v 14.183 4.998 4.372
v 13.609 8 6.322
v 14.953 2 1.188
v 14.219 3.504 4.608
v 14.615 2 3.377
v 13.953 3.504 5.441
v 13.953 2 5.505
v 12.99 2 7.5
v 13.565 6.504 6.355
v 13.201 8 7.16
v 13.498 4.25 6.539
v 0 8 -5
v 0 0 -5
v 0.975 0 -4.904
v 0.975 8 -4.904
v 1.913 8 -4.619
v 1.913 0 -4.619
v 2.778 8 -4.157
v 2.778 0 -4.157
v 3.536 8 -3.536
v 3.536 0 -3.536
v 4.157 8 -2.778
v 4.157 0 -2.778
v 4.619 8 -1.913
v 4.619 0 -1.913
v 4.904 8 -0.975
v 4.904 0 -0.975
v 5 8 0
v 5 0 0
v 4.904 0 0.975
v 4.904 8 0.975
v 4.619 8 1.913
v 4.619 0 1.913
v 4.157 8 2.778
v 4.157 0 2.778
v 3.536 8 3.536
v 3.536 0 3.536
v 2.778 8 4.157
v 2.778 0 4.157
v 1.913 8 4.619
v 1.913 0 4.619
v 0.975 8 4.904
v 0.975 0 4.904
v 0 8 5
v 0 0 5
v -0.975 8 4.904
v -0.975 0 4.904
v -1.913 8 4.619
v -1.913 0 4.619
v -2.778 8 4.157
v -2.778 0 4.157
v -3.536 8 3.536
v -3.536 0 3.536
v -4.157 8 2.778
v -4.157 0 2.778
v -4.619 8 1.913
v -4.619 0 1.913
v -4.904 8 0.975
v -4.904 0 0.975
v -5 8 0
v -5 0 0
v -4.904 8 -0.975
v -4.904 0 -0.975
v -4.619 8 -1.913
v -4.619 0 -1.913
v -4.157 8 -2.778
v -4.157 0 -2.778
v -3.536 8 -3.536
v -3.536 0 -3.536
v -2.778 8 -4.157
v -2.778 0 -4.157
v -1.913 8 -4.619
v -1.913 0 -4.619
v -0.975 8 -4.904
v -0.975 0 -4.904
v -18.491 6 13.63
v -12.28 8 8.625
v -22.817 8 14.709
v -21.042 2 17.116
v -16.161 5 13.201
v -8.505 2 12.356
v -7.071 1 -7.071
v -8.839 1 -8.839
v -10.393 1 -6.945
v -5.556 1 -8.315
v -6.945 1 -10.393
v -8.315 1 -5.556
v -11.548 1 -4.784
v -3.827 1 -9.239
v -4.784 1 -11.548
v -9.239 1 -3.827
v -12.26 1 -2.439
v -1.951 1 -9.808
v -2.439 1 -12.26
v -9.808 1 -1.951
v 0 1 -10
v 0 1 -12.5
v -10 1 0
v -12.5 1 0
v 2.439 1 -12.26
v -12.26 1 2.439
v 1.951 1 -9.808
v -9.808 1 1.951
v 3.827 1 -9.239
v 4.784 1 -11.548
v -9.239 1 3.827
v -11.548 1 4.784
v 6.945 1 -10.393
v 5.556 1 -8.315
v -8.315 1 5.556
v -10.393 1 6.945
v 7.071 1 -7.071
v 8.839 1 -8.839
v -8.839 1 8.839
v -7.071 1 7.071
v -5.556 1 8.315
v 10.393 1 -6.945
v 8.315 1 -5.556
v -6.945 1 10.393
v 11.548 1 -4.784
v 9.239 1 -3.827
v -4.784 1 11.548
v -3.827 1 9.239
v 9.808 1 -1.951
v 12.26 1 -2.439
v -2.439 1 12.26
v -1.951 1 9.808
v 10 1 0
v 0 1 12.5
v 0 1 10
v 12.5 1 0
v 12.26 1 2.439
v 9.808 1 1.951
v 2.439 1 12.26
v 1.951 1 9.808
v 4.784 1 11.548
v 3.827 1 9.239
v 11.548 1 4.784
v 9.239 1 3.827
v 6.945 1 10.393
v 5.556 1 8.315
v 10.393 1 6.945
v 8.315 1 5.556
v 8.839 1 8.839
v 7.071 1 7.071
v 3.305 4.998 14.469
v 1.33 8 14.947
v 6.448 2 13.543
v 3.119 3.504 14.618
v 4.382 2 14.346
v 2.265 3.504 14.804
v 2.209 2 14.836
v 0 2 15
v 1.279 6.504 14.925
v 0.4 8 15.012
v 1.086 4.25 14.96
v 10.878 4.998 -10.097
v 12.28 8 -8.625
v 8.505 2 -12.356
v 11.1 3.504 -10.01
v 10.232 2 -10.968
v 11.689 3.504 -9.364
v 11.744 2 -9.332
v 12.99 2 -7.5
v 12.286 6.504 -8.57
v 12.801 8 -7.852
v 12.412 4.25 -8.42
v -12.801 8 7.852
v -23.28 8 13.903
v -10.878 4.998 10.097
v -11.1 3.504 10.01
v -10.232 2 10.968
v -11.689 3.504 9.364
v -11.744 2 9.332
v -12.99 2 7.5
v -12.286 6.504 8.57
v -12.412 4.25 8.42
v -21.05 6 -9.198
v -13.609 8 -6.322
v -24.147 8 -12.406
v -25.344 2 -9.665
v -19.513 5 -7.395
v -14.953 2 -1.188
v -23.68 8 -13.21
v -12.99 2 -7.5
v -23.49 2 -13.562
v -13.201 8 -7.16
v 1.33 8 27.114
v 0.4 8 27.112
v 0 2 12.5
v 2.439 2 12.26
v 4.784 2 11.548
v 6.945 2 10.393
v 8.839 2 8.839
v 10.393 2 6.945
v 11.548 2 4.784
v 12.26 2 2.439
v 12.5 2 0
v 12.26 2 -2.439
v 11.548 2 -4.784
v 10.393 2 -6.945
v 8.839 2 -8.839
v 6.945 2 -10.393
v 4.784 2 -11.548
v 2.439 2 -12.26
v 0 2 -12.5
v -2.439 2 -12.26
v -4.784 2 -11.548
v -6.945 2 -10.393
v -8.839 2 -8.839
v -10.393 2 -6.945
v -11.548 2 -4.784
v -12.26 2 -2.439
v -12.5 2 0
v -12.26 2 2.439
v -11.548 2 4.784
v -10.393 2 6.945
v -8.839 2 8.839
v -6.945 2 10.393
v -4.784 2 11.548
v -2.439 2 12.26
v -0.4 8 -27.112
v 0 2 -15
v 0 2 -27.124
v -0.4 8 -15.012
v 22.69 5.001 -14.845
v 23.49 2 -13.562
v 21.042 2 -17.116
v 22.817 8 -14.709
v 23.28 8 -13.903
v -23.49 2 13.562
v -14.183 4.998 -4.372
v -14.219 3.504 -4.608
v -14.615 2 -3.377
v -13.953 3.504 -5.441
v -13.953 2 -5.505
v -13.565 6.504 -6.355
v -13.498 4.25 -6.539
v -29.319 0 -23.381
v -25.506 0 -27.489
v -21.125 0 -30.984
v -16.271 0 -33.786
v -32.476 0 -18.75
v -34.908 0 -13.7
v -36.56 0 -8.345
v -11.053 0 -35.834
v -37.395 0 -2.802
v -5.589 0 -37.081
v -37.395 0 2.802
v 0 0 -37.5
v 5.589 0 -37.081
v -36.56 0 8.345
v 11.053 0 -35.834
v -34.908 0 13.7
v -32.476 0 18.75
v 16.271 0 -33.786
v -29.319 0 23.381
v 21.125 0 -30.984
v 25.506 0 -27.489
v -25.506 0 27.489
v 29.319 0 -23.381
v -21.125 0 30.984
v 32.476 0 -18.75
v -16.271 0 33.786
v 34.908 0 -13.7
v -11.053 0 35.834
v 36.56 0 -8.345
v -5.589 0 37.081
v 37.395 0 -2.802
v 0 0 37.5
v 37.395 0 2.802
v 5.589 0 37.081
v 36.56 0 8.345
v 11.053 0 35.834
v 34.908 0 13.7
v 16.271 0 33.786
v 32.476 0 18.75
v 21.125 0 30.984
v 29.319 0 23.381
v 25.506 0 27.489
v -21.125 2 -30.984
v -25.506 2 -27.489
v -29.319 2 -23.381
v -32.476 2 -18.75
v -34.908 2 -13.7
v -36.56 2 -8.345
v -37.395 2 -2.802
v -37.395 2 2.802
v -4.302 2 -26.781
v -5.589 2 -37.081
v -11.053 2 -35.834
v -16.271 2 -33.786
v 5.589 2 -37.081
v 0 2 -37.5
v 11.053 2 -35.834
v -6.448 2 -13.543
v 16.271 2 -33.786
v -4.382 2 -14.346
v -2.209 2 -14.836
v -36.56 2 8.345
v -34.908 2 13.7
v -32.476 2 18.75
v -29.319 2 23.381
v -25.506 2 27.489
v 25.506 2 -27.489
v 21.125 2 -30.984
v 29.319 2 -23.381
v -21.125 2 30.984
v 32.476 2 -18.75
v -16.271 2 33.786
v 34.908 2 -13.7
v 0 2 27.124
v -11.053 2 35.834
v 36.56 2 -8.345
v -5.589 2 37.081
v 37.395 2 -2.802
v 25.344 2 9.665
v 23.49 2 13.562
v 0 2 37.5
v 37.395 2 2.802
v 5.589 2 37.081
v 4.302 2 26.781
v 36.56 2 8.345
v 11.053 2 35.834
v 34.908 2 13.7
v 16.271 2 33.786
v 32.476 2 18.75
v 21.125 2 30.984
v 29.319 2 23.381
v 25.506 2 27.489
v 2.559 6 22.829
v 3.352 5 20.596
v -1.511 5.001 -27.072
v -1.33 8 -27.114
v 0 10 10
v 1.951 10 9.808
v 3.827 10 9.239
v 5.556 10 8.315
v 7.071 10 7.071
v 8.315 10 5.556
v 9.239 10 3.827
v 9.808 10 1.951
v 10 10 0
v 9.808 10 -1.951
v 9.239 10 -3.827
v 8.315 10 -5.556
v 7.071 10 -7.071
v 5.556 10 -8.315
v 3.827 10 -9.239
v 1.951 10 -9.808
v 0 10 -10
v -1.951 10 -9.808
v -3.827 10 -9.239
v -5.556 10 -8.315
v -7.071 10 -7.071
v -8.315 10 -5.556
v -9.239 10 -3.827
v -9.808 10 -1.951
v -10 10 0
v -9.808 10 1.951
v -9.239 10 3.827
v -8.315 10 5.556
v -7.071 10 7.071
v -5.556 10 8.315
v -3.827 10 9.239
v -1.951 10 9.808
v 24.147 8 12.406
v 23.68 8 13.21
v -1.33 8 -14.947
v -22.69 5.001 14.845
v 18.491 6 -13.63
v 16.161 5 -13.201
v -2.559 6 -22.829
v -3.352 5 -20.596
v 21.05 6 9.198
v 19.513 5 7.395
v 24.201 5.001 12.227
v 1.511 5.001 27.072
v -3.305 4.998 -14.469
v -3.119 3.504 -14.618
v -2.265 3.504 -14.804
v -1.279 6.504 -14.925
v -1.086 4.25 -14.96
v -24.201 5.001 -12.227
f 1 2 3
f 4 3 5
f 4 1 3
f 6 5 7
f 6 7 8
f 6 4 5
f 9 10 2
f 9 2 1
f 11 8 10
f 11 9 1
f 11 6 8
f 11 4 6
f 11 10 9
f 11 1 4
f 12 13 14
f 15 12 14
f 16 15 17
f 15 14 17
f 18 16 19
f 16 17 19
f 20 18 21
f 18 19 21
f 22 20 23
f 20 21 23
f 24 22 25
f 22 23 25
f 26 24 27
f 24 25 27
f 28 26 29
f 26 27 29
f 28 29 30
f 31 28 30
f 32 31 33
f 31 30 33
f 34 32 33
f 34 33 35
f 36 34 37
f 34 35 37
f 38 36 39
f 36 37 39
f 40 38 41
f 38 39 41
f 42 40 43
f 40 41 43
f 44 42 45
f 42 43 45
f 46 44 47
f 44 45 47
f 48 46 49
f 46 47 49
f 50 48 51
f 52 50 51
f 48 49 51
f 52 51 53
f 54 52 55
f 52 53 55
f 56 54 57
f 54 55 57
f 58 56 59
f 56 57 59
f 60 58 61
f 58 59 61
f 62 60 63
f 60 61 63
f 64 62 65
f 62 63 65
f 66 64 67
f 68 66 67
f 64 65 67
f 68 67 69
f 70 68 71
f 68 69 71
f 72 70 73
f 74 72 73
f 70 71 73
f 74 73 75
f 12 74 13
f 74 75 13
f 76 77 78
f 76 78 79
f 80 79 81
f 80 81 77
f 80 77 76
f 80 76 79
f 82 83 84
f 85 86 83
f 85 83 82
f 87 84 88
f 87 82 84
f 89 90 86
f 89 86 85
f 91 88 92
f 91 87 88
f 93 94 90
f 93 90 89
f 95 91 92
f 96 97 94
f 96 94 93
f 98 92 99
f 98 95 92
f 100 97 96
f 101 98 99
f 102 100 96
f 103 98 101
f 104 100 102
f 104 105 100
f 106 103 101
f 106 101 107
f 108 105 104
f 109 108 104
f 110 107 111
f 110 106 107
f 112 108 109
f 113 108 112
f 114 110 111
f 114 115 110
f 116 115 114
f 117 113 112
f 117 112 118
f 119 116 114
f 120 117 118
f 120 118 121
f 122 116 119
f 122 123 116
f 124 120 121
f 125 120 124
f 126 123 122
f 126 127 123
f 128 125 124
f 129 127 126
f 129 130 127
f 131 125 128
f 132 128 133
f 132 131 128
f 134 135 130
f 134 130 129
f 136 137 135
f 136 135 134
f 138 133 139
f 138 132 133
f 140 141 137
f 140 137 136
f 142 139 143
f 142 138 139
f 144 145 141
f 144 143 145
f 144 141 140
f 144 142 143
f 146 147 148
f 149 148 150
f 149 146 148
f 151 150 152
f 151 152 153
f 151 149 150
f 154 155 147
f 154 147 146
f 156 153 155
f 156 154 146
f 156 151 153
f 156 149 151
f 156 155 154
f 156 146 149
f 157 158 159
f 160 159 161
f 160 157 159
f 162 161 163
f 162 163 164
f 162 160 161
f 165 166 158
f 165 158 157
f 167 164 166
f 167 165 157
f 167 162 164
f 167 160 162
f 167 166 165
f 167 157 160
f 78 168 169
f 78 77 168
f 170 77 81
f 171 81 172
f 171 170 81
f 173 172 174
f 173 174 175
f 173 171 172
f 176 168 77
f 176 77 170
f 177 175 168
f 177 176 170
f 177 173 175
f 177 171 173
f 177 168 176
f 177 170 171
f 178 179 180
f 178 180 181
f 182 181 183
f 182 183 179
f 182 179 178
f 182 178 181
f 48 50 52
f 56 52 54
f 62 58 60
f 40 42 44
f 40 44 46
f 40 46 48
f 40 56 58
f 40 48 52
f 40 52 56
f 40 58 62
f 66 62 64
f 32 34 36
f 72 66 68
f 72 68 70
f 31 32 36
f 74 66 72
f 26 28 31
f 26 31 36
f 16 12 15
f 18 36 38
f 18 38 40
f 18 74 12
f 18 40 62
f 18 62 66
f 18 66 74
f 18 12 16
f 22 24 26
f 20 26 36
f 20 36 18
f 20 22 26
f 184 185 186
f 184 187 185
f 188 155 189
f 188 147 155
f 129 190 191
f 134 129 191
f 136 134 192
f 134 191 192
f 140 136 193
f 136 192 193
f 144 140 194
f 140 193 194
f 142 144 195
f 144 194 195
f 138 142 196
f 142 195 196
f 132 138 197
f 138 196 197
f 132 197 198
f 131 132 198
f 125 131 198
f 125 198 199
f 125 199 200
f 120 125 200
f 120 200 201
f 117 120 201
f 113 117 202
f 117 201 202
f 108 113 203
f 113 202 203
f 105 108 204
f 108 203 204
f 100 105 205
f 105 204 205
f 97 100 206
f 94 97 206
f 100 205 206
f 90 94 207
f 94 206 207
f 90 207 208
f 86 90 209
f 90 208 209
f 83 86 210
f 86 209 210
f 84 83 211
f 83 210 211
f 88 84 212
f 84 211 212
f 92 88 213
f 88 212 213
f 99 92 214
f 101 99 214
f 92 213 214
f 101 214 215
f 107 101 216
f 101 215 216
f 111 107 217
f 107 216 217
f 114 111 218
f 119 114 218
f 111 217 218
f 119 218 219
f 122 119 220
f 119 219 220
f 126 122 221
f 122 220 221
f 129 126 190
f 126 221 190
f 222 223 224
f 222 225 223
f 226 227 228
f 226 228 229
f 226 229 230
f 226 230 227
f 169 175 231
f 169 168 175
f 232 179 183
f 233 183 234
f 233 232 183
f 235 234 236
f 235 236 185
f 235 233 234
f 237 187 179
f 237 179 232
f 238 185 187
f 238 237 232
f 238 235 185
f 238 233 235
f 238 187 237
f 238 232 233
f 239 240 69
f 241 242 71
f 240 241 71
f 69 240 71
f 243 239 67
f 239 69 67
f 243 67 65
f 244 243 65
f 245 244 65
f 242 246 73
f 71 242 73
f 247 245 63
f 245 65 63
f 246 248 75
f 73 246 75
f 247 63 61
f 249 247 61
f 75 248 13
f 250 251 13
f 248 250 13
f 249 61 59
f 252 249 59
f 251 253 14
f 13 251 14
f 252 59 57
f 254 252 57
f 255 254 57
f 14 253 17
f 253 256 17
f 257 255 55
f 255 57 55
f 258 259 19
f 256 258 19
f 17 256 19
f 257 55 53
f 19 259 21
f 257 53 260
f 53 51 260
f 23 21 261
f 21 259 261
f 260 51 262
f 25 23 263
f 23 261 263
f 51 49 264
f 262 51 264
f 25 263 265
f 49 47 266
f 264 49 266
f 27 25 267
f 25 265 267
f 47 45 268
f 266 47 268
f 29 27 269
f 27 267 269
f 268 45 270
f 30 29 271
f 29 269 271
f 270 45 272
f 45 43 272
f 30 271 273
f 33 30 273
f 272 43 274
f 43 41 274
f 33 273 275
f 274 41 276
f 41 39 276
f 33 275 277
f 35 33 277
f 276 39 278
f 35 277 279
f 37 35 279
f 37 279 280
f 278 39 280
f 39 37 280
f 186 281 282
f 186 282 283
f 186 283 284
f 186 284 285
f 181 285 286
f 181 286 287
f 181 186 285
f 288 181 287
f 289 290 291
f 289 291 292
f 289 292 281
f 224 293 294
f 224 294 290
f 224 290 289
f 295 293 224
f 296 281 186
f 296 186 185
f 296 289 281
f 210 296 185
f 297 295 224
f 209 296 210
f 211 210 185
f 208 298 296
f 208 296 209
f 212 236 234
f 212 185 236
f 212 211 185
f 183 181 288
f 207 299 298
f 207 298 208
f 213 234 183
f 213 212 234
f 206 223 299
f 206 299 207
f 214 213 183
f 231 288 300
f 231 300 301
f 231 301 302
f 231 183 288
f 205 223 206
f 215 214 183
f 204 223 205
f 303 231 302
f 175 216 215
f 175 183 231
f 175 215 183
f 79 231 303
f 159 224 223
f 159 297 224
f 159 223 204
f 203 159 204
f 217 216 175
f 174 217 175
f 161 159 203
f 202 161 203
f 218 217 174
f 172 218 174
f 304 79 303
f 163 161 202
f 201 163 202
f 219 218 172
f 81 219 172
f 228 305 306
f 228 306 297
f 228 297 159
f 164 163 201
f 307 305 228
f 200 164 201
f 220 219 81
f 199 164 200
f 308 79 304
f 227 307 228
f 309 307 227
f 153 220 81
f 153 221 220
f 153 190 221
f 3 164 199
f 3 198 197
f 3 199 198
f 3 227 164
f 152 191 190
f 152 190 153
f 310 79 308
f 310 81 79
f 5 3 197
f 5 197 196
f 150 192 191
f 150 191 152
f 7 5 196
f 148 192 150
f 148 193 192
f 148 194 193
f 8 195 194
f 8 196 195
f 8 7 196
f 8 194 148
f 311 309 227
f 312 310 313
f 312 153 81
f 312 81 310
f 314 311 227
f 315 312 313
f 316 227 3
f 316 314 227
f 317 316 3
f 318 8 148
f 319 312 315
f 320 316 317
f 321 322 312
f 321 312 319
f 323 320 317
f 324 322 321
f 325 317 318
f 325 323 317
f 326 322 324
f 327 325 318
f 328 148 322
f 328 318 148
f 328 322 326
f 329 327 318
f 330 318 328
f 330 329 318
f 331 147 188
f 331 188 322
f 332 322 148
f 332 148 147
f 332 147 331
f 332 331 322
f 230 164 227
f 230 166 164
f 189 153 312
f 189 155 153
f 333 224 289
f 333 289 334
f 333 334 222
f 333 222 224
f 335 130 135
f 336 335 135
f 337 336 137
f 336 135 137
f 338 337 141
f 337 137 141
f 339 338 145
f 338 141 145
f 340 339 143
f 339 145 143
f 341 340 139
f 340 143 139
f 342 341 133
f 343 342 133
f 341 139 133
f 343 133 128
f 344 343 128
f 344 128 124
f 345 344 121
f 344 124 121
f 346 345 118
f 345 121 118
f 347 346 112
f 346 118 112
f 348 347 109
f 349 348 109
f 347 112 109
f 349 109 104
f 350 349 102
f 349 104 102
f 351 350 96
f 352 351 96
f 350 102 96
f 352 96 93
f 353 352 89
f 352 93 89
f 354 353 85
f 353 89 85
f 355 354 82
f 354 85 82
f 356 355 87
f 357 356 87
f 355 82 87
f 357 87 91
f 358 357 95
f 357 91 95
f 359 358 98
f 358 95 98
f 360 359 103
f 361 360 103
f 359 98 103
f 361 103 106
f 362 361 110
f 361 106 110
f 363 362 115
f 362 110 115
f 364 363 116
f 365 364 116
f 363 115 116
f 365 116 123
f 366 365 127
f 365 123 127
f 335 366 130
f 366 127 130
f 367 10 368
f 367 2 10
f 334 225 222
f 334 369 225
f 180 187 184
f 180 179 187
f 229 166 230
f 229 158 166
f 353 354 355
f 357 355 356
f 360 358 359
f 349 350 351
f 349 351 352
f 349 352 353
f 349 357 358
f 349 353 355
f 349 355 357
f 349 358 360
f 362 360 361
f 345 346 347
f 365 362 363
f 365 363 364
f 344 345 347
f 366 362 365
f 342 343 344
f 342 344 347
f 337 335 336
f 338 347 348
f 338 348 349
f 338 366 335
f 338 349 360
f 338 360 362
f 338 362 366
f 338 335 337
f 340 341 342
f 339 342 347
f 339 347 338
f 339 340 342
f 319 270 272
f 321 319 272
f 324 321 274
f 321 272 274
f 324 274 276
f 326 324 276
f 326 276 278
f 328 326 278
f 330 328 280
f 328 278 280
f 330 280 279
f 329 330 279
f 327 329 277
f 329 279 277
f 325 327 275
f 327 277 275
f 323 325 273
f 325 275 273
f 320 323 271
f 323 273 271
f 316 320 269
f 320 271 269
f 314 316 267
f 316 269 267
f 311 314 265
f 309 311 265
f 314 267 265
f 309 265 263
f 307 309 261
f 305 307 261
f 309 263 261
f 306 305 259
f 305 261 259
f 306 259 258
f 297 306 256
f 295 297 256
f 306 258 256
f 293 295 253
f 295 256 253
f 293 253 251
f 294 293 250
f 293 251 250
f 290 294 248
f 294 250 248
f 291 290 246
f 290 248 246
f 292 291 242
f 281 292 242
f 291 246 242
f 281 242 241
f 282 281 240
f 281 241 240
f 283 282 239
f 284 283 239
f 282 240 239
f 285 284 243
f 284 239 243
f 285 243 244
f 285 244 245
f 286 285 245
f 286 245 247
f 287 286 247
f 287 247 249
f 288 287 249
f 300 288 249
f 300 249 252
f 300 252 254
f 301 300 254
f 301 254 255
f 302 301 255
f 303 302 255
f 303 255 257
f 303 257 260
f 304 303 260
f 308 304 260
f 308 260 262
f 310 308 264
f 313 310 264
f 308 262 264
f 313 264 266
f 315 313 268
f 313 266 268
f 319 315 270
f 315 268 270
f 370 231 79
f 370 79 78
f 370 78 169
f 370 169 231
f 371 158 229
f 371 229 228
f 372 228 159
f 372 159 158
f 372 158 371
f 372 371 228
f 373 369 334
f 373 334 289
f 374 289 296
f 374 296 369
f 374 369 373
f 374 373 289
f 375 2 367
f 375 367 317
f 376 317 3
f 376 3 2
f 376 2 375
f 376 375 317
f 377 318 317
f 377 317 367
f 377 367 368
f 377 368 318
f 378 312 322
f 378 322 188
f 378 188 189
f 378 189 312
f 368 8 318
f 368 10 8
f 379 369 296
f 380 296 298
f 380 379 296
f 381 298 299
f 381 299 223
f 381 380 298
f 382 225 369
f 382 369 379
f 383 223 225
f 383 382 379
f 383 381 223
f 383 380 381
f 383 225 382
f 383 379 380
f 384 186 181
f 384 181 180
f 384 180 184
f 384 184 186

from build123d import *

# Parameters (mm, degrees)
SKETCH2_R           = 37.5
BOSS_EXTRUDE1_DEPTH = 2
CIRPATTERN1_COUNT   = 6
SKETCH6_R           = 12.5
CUT_EXTRUDE1_DEPTH  = 1
SKETCH7_R           = 10
BOSS_EXTRUDE2_DEPTH = 9
SKETCH8_R           = 5
CUT_EXTRUDE2_DEPTH  = 8


with BuildPart() as part:
    # Sketch2 → Boss-Extrude1 (new body)
    with BuildSketch(Plane(origin=(0, 0, 0), x_dir=(1, 0, 0), z_dir=(0, 1, 0))):
        with Locations(Location((0, 0, 0), (0, 0, 270))):
            Circle(SKETCH2_R)
    extrude(amount=BOSS_EXTRUDE1_DEPTH)

    # Sketch3 for Loft1 → Loft1 section 0
    with BuildSketch(Plane(origin=(0, 2, 0), x_dir=(1, 0, 0), z_dir=(0, 1, 0))):
        with BuildLine():
            Line((0, -15), (0, -27.124270964))
            # circular arc as an exact rational Bezier (weights 1, cos(half-angle), 1)
            Bezier((0, -27.124270964), (2.164566304, -27.124270964), (4.301737718, -26.780984447), weights=[1, 0.996830963, 1])
            Line((4.301737718, -26.780984447), (6.447780139, -13.543490366))
            Bezier((6.447780139, -13.543490366), (3.388397874, -15), (0, -15), weights=[1, 0.975422821, 1])
        make_face()
    # Sketch4 for Loft1 → Loft1 section 1
    with BuildSketch(Plane(origin=(0, 8, 0), x_dir=(1, 0, 0), z_dir=(0, 1, 0))):
        with BuildLine():
            Line((0.4, -15.012151174), (0.4, -27.112269684))
            Bezier((0.4, -27.112269684), (0.86490704, -27.099253481), (1.32975035, -27.114375462), weights=[1, 0.999542352, 1])
            Line((1.32975035, -27.114375462), (1.32975035, -14.94692609))
            Line((1.32975035, -14.94692609), (0.4, -15.012151174))
        make_face()
    loft1 = loft()

    # CirPattern1: Loft1 ×6 about axis
    cirpattern1_axis = Axis((0, -1000, 0), (0, 1, 0))
    for i in range(1, CIRPATTERN1_COUNT):
        add(loft1.rotate(cirpattern1_axis, i * 360 / CIRPATTERN1_COUNT))

    # Sketch6 → Cut-Extrude1 (cut)
    with BuildSketch(Plane(origin=(0, 2, 0), x_dir=(1, 0, 0), z_dir=(0, 1, 0))):
        with Locations(Location((0, 0, 0), (0, 0, 270))):
            Circle(SKETCH6_R)
    extrude(amount=-CUT_EXTRUDE1_DEPTH, mode=Mode.SUBTRACT)

    # Sketch7 → Boss-Extrude2 (add)
    with BuildSketch(Plane(origin=(0, 1, 0), x_dir=(1, 0, 0), z_dir=(0, 1, 0))):
        with Locations(Location((0, 0, 0), (0, 0, 270))):
            Circle(SKETCH7_R)
    extrude(amount=BOSS_EXTRUDE2_DEPTH)

    # Sketch8 → Cut-Extrude2 (cut)
    with BuildSketch(Plane.XZ):
        with Locations(Location((0, 0, 0), (0, 0, 270))):
            Circle(SKETCH8_R)
    extrude(amount=-CUT_EXTRUDE2_DEPTH, mode=Mode.SUBTRACT)


solid = part.part
